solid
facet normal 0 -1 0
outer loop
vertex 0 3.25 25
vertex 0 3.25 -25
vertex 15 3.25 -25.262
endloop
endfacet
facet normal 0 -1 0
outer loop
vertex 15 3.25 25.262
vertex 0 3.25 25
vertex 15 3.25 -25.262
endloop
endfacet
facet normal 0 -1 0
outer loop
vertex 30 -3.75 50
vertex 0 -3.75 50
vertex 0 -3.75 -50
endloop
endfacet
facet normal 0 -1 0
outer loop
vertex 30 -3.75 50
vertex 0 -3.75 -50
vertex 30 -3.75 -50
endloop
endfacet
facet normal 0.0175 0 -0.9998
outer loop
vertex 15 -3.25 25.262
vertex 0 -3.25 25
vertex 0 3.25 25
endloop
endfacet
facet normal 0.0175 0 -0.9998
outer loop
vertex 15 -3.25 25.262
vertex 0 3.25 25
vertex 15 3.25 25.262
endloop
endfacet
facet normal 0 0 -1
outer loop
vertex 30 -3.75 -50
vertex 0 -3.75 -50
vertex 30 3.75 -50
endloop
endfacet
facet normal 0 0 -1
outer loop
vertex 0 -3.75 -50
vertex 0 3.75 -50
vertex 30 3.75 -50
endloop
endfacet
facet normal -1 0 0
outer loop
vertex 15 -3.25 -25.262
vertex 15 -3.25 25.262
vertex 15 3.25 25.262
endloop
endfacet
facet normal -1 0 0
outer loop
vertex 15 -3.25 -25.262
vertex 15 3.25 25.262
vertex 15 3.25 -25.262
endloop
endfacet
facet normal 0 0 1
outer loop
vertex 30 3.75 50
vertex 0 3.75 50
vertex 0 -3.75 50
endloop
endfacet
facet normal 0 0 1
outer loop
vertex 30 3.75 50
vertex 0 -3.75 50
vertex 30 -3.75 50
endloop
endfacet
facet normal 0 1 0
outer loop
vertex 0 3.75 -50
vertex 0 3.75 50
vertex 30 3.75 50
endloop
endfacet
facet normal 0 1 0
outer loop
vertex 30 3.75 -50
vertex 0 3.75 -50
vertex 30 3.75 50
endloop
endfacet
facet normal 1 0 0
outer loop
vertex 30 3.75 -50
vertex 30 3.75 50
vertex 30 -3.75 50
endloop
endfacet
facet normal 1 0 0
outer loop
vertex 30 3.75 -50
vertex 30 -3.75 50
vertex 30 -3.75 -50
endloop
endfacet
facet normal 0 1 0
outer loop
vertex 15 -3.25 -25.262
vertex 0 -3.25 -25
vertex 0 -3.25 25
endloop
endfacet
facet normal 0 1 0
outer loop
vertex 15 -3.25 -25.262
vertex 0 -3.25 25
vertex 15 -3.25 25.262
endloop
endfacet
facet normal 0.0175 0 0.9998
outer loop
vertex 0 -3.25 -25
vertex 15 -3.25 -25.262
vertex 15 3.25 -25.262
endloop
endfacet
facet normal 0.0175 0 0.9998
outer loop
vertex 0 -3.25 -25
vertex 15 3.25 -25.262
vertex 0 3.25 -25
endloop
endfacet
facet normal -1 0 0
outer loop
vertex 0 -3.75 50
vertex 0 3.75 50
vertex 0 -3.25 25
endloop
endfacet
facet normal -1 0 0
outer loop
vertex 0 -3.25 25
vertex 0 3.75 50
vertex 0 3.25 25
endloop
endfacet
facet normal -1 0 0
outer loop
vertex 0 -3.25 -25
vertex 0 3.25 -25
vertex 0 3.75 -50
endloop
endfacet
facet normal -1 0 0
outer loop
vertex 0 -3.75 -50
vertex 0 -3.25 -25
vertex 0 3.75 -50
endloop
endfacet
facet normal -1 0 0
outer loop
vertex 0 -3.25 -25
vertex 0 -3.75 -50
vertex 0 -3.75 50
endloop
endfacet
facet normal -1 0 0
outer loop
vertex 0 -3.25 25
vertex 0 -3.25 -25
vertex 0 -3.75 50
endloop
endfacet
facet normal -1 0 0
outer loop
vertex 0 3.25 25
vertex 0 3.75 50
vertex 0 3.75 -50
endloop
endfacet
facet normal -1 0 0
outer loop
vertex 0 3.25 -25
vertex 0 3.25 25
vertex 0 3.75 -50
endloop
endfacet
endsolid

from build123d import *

# Parameters (mm, degrees)
SKETCH1_W           = 30
SKETCH1_H           = 100
BOSS_EXTRUDE1_DEPTH = 3.75
CUT_EXTRUDE1_DEPTH  = 6.5


with BuildPart() as part:
    # Sketch1 → Boss-Extrude1 (new, symmetric)
    with BuildSketch(Plane(origin=(0, 0, 0), x_dir=(1, 0, 0), z_dir=(0, 1, 0))):
        with Locations((15, 0)):
            Rectangle(SKETCH1_W, SKETCH1_H)
    extrude(amount=BOSS_EXTRUDE1_DEPTH, both=True)

    # Sketch2 → Cut-Extrude1 (cut)
    with BuildSketch(Plane(origin=(0, -3.25, 0), x_dir=(1, 0, 0), z_dir=(0, 1, 0))):
        Polygon((0, 25), (0, -25), (15, -25.261825974), (15, 25.261825974), align=None)
    extrude(amount=CUT_EXTRUDE1_DEPTH, mode=Mode.SUBTRACT)


solid = part.part
